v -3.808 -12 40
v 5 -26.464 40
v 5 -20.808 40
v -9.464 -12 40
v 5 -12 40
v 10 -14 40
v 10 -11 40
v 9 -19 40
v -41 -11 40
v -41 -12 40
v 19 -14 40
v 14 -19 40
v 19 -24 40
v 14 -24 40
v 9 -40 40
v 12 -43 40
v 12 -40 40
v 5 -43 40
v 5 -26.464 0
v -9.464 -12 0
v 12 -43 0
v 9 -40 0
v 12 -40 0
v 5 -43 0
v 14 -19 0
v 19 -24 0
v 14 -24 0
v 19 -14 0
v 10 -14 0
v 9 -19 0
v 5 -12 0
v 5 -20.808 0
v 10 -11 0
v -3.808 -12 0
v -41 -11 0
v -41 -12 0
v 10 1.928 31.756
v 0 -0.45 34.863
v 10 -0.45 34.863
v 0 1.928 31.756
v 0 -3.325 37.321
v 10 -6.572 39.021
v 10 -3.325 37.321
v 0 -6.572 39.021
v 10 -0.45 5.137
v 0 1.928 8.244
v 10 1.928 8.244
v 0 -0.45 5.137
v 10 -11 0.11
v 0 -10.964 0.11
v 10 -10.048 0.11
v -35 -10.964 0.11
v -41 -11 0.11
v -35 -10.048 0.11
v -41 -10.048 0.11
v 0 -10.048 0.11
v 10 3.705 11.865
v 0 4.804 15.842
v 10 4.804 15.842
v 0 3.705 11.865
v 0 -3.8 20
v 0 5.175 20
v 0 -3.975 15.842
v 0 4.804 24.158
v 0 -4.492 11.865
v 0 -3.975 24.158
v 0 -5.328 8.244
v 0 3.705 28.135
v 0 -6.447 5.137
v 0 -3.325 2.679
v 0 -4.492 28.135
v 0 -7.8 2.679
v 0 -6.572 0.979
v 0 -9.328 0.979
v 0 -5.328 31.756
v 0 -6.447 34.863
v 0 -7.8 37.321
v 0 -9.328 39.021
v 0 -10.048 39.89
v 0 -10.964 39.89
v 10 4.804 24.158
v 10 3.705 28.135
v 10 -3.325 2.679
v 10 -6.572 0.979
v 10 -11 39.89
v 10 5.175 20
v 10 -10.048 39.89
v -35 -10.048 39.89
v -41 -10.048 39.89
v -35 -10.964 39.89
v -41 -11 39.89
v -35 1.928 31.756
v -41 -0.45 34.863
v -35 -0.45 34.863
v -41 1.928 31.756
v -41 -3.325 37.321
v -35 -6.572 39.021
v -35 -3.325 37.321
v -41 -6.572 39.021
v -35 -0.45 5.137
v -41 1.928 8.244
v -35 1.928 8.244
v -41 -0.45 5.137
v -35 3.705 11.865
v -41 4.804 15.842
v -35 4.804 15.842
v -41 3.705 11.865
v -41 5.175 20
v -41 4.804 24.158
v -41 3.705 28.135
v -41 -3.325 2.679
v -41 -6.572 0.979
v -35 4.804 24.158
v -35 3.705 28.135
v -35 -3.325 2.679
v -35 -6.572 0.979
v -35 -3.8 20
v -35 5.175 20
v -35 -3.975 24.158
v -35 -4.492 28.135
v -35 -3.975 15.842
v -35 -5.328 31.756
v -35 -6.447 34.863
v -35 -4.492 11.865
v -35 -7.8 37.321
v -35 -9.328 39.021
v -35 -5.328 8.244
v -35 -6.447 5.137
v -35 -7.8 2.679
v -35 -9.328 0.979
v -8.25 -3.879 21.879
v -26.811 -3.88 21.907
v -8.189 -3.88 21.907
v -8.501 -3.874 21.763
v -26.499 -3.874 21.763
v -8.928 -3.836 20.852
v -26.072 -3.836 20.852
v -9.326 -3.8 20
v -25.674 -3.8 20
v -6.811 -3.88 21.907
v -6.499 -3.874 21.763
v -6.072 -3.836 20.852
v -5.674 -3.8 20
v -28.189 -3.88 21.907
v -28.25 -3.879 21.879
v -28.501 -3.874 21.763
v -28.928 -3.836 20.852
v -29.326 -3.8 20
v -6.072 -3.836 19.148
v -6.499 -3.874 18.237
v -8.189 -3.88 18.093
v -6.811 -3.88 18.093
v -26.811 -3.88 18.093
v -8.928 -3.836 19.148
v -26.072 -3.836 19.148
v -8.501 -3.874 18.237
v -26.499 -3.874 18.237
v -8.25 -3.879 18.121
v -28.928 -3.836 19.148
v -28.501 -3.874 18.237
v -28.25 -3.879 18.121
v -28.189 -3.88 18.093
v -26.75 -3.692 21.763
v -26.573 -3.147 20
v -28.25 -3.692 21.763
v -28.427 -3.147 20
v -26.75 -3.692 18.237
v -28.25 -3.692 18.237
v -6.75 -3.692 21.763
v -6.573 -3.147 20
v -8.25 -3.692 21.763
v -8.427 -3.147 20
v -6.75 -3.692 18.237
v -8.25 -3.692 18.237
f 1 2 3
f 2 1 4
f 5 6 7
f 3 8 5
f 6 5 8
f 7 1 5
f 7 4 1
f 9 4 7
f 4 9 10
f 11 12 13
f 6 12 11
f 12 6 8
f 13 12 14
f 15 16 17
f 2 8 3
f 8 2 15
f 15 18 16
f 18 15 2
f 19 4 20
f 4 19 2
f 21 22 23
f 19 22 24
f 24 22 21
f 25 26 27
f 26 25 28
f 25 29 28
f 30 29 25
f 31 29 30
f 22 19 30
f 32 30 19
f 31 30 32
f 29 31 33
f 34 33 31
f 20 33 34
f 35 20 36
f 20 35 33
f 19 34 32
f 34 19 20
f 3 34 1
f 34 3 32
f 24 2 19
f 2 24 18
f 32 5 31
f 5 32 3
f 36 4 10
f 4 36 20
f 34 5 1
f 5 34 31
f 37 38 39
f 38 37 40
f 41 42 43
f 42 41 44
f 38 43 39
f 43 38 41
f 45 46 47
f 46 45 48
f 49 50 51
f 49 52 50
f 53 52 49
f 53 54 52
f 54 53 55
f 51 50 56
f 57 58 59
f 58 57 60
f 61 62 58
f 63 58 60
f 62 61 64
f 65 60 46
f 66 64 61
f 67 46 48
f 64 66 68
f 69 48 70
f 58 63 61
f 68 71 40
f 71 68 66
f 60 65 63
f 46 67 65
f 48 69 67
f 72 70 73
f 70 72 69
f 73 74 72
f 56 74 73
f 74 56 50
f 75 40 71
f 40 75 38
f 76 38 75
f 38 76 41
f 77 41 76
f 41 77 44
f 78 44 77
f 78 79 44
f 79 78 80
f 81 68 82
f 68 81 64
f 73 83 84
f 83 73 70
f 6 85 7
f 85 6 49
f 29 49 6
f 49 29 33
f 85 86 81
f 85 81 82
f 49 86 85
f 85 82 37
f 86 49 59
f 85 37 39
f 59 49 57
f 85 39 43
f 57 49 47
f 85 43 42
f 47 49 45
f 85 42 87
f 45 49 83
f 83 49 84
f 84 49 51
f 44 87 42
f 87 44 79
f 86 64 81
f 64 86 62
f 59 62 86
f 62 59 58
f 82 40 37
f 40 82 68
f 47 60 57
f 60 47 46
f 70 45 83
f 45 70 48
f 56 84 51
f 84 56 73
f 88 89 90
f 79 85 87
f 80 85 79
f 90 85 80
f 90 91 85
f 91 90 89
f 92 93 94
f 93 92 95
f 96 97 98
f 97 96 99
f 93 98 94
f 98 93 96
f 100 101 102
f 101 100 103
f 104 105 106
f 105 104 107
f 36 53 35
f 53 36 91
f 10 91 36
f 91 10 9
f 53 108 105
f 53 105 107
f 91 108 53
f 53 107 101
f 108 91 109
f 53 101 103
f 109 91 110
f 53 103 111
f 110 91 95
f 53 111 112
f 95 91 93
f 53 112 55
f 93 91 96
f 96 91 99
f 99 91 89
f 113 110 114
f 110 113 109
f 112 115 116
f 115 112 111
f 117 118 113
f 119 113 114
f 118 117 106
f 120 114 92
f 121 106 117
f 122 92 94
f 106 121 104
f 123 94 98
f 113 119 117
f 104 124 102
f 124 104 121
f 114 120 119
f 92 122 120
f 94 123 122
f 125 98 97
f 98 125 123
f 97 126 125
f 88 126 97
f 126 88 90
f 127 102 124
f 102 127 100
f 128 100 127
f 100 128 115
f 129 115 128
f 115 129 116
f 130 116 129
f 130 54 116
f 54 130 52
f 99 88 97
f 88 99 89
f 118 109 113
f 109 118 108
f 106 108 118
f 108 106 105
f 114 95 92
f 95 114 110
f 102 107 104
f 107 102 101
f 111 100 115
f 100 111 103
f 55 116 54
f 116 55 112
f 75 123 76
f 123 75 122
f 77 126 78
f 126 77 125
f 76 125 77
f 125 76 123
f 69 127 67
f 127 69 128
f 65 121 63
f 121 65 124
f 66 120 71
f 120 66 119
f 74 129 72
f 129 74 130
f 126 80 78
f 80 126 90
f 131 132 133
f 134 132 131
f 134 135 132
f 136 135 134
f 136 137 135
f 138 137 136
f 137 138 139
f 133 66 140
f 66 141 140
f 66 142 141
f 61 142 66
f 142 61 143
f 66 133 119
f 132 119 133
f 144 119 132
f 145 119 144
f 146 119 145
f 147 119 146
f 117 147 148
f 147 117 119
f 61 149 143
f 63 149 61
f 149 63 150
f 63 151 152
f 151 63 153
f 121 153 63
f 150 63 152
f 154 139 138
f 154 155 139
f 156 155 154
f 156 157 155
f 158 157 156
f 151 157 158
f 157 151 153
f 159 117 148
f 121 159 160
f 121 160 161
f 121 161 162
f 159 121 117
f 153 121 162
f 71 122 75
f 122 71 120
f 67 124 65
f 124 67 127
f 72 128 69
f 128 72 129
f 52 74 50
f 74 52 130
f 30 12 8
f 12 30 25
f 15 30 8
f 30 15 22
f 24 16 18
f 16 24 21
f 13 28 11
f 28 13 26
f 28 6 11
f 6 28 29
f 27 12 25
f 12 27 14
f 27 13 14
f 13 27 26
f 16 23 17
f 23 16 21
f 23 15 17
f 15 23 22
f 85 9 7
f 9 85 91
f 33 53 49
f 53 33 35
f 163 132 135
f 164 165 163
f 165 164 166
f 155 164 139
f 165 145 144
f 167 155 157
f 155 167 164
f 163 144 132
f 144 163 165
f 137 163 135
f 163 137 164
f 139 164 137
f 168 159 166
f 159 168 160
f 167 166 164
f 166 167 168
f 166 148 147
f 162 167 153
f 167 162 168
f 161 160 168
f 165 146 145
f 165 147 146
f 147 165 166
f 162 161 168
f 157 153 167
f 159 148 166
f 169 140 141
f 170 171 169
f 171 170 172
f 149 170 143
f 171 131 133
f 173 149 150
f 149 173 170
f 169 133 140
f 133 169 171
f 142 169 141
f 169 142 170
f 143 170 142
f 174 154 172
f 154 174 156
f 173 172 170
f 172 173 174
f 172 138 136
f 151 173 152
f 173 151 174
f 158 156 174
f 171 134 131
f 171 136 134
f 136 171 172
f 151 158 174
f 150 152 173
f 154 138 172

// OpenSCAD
/*
 * Based on the "Fabrikator mini Esun Spool holder" by "Rlw":
 * http://www.thingiverse.com/thing:1324831
 *
 * Recreated and parameterized by:
 * Thomas Buck <xythobuz@xythobuz.de> in March 2016
 *
 * Licensed under the Creative Commons - Attribution license.
 *
 * Settings suggested by the original author:
 *   Rafts: No
 *   Supports: No
 *   Resolution: 0.2mm
 *   Infill: 15%
 */

// Modify the overall length (moving the top part)
size_modifier = -25;

// Spool width
spool_width = 35;

// Distance of spool rollers from border
balls_distance = 7.5;

// width of outer spool border
outer_border_width = 6;

// set if the inner spool border should be rounded
// to save some more material
round_top = true;

// -----------------------------------------------------------

inner_border_width = round_top ? 10 : 5;
body_height_modifier = round_top ? -19 : 0;

// -----------------------------------------------------------

// a cylinder cut in half in the middle
module half_cylinder(h, r) {
    difference() {
        cylinder(h, r, r);
        translate([0, -r, 0]) cube([r, 2 * r, h]);
    }
}

// -----------------------------------------------------------

//import("fabrikator_mini_gsun_5kg_175mm__spool_holder.stl");

// upper body
translate([5, -19, 0])
    cube([5, 51 + size_modifier + body_height_modifier, 40]);

// lower body
translate([5, -43, 0])
    cube([4, 24, 40]);

// upper border
translate([10, -19, 0])
    cube([9, 5, 40]);

// upper lip
translate([14, -24, 0])
    cube([5, 5, 40]);

// lower border
translate([9, -43, 0])
    cube([3, 3, 40]);

// stabilization
translate([0,  size_modifier, 0]) difference() {
    rotate([0, 0, 45]) translate([2.5, -5, 0]) cube([4, 21, 40]);

    translate([5, -5, 0]) cube([10, 10, 40]);
    translate([-10, 13, 0]) cube([10, 10, 40]);
}

// inner border
translate([0,  size_modifier, 0])
    scale([1, 0.85, 1])
    translate([0, 15.5, 20])
    rotate([-90, 0, 0])
    rotate([0, 90, 0])
    half_cylinder(inner_border_width, 20);

// outer border
translate([0,  size_modifier, 0])
    scale([1, 0.85, 1])
    translate([-(spool_width + outer_border_width), 15.5, 20])
    rotate([-90, 0, 0])
    rotate([0, 90, 0])
    half_cylinder(outer_border_width, 20);

// roll plane
translate([0,  size_modifier, 0])
    translate([-(spool_width + outer_border_width), 13, 0])
    cube([spool_width + outer_border_width + inner_border_width, 1, 40]);

// roll
translate([0,  size_modifier, 0])
    scale([1, 0.4, 1])
    translate([-spool_width, 33, 20])
    rotate([-90, 0, 0])
    rotate([0, 90, 0])
    half_cylinder(spool_width, 20);

// rolling balls
translate([0,  size_modifier, 0])
    translate([-(spool_width - balls_distance), 19, 20])
    sphere(r = 3);
translate([0,  size_modifier, 0])
    translate([-balls_distance, 19, 20])
    sphere(r = 3);
